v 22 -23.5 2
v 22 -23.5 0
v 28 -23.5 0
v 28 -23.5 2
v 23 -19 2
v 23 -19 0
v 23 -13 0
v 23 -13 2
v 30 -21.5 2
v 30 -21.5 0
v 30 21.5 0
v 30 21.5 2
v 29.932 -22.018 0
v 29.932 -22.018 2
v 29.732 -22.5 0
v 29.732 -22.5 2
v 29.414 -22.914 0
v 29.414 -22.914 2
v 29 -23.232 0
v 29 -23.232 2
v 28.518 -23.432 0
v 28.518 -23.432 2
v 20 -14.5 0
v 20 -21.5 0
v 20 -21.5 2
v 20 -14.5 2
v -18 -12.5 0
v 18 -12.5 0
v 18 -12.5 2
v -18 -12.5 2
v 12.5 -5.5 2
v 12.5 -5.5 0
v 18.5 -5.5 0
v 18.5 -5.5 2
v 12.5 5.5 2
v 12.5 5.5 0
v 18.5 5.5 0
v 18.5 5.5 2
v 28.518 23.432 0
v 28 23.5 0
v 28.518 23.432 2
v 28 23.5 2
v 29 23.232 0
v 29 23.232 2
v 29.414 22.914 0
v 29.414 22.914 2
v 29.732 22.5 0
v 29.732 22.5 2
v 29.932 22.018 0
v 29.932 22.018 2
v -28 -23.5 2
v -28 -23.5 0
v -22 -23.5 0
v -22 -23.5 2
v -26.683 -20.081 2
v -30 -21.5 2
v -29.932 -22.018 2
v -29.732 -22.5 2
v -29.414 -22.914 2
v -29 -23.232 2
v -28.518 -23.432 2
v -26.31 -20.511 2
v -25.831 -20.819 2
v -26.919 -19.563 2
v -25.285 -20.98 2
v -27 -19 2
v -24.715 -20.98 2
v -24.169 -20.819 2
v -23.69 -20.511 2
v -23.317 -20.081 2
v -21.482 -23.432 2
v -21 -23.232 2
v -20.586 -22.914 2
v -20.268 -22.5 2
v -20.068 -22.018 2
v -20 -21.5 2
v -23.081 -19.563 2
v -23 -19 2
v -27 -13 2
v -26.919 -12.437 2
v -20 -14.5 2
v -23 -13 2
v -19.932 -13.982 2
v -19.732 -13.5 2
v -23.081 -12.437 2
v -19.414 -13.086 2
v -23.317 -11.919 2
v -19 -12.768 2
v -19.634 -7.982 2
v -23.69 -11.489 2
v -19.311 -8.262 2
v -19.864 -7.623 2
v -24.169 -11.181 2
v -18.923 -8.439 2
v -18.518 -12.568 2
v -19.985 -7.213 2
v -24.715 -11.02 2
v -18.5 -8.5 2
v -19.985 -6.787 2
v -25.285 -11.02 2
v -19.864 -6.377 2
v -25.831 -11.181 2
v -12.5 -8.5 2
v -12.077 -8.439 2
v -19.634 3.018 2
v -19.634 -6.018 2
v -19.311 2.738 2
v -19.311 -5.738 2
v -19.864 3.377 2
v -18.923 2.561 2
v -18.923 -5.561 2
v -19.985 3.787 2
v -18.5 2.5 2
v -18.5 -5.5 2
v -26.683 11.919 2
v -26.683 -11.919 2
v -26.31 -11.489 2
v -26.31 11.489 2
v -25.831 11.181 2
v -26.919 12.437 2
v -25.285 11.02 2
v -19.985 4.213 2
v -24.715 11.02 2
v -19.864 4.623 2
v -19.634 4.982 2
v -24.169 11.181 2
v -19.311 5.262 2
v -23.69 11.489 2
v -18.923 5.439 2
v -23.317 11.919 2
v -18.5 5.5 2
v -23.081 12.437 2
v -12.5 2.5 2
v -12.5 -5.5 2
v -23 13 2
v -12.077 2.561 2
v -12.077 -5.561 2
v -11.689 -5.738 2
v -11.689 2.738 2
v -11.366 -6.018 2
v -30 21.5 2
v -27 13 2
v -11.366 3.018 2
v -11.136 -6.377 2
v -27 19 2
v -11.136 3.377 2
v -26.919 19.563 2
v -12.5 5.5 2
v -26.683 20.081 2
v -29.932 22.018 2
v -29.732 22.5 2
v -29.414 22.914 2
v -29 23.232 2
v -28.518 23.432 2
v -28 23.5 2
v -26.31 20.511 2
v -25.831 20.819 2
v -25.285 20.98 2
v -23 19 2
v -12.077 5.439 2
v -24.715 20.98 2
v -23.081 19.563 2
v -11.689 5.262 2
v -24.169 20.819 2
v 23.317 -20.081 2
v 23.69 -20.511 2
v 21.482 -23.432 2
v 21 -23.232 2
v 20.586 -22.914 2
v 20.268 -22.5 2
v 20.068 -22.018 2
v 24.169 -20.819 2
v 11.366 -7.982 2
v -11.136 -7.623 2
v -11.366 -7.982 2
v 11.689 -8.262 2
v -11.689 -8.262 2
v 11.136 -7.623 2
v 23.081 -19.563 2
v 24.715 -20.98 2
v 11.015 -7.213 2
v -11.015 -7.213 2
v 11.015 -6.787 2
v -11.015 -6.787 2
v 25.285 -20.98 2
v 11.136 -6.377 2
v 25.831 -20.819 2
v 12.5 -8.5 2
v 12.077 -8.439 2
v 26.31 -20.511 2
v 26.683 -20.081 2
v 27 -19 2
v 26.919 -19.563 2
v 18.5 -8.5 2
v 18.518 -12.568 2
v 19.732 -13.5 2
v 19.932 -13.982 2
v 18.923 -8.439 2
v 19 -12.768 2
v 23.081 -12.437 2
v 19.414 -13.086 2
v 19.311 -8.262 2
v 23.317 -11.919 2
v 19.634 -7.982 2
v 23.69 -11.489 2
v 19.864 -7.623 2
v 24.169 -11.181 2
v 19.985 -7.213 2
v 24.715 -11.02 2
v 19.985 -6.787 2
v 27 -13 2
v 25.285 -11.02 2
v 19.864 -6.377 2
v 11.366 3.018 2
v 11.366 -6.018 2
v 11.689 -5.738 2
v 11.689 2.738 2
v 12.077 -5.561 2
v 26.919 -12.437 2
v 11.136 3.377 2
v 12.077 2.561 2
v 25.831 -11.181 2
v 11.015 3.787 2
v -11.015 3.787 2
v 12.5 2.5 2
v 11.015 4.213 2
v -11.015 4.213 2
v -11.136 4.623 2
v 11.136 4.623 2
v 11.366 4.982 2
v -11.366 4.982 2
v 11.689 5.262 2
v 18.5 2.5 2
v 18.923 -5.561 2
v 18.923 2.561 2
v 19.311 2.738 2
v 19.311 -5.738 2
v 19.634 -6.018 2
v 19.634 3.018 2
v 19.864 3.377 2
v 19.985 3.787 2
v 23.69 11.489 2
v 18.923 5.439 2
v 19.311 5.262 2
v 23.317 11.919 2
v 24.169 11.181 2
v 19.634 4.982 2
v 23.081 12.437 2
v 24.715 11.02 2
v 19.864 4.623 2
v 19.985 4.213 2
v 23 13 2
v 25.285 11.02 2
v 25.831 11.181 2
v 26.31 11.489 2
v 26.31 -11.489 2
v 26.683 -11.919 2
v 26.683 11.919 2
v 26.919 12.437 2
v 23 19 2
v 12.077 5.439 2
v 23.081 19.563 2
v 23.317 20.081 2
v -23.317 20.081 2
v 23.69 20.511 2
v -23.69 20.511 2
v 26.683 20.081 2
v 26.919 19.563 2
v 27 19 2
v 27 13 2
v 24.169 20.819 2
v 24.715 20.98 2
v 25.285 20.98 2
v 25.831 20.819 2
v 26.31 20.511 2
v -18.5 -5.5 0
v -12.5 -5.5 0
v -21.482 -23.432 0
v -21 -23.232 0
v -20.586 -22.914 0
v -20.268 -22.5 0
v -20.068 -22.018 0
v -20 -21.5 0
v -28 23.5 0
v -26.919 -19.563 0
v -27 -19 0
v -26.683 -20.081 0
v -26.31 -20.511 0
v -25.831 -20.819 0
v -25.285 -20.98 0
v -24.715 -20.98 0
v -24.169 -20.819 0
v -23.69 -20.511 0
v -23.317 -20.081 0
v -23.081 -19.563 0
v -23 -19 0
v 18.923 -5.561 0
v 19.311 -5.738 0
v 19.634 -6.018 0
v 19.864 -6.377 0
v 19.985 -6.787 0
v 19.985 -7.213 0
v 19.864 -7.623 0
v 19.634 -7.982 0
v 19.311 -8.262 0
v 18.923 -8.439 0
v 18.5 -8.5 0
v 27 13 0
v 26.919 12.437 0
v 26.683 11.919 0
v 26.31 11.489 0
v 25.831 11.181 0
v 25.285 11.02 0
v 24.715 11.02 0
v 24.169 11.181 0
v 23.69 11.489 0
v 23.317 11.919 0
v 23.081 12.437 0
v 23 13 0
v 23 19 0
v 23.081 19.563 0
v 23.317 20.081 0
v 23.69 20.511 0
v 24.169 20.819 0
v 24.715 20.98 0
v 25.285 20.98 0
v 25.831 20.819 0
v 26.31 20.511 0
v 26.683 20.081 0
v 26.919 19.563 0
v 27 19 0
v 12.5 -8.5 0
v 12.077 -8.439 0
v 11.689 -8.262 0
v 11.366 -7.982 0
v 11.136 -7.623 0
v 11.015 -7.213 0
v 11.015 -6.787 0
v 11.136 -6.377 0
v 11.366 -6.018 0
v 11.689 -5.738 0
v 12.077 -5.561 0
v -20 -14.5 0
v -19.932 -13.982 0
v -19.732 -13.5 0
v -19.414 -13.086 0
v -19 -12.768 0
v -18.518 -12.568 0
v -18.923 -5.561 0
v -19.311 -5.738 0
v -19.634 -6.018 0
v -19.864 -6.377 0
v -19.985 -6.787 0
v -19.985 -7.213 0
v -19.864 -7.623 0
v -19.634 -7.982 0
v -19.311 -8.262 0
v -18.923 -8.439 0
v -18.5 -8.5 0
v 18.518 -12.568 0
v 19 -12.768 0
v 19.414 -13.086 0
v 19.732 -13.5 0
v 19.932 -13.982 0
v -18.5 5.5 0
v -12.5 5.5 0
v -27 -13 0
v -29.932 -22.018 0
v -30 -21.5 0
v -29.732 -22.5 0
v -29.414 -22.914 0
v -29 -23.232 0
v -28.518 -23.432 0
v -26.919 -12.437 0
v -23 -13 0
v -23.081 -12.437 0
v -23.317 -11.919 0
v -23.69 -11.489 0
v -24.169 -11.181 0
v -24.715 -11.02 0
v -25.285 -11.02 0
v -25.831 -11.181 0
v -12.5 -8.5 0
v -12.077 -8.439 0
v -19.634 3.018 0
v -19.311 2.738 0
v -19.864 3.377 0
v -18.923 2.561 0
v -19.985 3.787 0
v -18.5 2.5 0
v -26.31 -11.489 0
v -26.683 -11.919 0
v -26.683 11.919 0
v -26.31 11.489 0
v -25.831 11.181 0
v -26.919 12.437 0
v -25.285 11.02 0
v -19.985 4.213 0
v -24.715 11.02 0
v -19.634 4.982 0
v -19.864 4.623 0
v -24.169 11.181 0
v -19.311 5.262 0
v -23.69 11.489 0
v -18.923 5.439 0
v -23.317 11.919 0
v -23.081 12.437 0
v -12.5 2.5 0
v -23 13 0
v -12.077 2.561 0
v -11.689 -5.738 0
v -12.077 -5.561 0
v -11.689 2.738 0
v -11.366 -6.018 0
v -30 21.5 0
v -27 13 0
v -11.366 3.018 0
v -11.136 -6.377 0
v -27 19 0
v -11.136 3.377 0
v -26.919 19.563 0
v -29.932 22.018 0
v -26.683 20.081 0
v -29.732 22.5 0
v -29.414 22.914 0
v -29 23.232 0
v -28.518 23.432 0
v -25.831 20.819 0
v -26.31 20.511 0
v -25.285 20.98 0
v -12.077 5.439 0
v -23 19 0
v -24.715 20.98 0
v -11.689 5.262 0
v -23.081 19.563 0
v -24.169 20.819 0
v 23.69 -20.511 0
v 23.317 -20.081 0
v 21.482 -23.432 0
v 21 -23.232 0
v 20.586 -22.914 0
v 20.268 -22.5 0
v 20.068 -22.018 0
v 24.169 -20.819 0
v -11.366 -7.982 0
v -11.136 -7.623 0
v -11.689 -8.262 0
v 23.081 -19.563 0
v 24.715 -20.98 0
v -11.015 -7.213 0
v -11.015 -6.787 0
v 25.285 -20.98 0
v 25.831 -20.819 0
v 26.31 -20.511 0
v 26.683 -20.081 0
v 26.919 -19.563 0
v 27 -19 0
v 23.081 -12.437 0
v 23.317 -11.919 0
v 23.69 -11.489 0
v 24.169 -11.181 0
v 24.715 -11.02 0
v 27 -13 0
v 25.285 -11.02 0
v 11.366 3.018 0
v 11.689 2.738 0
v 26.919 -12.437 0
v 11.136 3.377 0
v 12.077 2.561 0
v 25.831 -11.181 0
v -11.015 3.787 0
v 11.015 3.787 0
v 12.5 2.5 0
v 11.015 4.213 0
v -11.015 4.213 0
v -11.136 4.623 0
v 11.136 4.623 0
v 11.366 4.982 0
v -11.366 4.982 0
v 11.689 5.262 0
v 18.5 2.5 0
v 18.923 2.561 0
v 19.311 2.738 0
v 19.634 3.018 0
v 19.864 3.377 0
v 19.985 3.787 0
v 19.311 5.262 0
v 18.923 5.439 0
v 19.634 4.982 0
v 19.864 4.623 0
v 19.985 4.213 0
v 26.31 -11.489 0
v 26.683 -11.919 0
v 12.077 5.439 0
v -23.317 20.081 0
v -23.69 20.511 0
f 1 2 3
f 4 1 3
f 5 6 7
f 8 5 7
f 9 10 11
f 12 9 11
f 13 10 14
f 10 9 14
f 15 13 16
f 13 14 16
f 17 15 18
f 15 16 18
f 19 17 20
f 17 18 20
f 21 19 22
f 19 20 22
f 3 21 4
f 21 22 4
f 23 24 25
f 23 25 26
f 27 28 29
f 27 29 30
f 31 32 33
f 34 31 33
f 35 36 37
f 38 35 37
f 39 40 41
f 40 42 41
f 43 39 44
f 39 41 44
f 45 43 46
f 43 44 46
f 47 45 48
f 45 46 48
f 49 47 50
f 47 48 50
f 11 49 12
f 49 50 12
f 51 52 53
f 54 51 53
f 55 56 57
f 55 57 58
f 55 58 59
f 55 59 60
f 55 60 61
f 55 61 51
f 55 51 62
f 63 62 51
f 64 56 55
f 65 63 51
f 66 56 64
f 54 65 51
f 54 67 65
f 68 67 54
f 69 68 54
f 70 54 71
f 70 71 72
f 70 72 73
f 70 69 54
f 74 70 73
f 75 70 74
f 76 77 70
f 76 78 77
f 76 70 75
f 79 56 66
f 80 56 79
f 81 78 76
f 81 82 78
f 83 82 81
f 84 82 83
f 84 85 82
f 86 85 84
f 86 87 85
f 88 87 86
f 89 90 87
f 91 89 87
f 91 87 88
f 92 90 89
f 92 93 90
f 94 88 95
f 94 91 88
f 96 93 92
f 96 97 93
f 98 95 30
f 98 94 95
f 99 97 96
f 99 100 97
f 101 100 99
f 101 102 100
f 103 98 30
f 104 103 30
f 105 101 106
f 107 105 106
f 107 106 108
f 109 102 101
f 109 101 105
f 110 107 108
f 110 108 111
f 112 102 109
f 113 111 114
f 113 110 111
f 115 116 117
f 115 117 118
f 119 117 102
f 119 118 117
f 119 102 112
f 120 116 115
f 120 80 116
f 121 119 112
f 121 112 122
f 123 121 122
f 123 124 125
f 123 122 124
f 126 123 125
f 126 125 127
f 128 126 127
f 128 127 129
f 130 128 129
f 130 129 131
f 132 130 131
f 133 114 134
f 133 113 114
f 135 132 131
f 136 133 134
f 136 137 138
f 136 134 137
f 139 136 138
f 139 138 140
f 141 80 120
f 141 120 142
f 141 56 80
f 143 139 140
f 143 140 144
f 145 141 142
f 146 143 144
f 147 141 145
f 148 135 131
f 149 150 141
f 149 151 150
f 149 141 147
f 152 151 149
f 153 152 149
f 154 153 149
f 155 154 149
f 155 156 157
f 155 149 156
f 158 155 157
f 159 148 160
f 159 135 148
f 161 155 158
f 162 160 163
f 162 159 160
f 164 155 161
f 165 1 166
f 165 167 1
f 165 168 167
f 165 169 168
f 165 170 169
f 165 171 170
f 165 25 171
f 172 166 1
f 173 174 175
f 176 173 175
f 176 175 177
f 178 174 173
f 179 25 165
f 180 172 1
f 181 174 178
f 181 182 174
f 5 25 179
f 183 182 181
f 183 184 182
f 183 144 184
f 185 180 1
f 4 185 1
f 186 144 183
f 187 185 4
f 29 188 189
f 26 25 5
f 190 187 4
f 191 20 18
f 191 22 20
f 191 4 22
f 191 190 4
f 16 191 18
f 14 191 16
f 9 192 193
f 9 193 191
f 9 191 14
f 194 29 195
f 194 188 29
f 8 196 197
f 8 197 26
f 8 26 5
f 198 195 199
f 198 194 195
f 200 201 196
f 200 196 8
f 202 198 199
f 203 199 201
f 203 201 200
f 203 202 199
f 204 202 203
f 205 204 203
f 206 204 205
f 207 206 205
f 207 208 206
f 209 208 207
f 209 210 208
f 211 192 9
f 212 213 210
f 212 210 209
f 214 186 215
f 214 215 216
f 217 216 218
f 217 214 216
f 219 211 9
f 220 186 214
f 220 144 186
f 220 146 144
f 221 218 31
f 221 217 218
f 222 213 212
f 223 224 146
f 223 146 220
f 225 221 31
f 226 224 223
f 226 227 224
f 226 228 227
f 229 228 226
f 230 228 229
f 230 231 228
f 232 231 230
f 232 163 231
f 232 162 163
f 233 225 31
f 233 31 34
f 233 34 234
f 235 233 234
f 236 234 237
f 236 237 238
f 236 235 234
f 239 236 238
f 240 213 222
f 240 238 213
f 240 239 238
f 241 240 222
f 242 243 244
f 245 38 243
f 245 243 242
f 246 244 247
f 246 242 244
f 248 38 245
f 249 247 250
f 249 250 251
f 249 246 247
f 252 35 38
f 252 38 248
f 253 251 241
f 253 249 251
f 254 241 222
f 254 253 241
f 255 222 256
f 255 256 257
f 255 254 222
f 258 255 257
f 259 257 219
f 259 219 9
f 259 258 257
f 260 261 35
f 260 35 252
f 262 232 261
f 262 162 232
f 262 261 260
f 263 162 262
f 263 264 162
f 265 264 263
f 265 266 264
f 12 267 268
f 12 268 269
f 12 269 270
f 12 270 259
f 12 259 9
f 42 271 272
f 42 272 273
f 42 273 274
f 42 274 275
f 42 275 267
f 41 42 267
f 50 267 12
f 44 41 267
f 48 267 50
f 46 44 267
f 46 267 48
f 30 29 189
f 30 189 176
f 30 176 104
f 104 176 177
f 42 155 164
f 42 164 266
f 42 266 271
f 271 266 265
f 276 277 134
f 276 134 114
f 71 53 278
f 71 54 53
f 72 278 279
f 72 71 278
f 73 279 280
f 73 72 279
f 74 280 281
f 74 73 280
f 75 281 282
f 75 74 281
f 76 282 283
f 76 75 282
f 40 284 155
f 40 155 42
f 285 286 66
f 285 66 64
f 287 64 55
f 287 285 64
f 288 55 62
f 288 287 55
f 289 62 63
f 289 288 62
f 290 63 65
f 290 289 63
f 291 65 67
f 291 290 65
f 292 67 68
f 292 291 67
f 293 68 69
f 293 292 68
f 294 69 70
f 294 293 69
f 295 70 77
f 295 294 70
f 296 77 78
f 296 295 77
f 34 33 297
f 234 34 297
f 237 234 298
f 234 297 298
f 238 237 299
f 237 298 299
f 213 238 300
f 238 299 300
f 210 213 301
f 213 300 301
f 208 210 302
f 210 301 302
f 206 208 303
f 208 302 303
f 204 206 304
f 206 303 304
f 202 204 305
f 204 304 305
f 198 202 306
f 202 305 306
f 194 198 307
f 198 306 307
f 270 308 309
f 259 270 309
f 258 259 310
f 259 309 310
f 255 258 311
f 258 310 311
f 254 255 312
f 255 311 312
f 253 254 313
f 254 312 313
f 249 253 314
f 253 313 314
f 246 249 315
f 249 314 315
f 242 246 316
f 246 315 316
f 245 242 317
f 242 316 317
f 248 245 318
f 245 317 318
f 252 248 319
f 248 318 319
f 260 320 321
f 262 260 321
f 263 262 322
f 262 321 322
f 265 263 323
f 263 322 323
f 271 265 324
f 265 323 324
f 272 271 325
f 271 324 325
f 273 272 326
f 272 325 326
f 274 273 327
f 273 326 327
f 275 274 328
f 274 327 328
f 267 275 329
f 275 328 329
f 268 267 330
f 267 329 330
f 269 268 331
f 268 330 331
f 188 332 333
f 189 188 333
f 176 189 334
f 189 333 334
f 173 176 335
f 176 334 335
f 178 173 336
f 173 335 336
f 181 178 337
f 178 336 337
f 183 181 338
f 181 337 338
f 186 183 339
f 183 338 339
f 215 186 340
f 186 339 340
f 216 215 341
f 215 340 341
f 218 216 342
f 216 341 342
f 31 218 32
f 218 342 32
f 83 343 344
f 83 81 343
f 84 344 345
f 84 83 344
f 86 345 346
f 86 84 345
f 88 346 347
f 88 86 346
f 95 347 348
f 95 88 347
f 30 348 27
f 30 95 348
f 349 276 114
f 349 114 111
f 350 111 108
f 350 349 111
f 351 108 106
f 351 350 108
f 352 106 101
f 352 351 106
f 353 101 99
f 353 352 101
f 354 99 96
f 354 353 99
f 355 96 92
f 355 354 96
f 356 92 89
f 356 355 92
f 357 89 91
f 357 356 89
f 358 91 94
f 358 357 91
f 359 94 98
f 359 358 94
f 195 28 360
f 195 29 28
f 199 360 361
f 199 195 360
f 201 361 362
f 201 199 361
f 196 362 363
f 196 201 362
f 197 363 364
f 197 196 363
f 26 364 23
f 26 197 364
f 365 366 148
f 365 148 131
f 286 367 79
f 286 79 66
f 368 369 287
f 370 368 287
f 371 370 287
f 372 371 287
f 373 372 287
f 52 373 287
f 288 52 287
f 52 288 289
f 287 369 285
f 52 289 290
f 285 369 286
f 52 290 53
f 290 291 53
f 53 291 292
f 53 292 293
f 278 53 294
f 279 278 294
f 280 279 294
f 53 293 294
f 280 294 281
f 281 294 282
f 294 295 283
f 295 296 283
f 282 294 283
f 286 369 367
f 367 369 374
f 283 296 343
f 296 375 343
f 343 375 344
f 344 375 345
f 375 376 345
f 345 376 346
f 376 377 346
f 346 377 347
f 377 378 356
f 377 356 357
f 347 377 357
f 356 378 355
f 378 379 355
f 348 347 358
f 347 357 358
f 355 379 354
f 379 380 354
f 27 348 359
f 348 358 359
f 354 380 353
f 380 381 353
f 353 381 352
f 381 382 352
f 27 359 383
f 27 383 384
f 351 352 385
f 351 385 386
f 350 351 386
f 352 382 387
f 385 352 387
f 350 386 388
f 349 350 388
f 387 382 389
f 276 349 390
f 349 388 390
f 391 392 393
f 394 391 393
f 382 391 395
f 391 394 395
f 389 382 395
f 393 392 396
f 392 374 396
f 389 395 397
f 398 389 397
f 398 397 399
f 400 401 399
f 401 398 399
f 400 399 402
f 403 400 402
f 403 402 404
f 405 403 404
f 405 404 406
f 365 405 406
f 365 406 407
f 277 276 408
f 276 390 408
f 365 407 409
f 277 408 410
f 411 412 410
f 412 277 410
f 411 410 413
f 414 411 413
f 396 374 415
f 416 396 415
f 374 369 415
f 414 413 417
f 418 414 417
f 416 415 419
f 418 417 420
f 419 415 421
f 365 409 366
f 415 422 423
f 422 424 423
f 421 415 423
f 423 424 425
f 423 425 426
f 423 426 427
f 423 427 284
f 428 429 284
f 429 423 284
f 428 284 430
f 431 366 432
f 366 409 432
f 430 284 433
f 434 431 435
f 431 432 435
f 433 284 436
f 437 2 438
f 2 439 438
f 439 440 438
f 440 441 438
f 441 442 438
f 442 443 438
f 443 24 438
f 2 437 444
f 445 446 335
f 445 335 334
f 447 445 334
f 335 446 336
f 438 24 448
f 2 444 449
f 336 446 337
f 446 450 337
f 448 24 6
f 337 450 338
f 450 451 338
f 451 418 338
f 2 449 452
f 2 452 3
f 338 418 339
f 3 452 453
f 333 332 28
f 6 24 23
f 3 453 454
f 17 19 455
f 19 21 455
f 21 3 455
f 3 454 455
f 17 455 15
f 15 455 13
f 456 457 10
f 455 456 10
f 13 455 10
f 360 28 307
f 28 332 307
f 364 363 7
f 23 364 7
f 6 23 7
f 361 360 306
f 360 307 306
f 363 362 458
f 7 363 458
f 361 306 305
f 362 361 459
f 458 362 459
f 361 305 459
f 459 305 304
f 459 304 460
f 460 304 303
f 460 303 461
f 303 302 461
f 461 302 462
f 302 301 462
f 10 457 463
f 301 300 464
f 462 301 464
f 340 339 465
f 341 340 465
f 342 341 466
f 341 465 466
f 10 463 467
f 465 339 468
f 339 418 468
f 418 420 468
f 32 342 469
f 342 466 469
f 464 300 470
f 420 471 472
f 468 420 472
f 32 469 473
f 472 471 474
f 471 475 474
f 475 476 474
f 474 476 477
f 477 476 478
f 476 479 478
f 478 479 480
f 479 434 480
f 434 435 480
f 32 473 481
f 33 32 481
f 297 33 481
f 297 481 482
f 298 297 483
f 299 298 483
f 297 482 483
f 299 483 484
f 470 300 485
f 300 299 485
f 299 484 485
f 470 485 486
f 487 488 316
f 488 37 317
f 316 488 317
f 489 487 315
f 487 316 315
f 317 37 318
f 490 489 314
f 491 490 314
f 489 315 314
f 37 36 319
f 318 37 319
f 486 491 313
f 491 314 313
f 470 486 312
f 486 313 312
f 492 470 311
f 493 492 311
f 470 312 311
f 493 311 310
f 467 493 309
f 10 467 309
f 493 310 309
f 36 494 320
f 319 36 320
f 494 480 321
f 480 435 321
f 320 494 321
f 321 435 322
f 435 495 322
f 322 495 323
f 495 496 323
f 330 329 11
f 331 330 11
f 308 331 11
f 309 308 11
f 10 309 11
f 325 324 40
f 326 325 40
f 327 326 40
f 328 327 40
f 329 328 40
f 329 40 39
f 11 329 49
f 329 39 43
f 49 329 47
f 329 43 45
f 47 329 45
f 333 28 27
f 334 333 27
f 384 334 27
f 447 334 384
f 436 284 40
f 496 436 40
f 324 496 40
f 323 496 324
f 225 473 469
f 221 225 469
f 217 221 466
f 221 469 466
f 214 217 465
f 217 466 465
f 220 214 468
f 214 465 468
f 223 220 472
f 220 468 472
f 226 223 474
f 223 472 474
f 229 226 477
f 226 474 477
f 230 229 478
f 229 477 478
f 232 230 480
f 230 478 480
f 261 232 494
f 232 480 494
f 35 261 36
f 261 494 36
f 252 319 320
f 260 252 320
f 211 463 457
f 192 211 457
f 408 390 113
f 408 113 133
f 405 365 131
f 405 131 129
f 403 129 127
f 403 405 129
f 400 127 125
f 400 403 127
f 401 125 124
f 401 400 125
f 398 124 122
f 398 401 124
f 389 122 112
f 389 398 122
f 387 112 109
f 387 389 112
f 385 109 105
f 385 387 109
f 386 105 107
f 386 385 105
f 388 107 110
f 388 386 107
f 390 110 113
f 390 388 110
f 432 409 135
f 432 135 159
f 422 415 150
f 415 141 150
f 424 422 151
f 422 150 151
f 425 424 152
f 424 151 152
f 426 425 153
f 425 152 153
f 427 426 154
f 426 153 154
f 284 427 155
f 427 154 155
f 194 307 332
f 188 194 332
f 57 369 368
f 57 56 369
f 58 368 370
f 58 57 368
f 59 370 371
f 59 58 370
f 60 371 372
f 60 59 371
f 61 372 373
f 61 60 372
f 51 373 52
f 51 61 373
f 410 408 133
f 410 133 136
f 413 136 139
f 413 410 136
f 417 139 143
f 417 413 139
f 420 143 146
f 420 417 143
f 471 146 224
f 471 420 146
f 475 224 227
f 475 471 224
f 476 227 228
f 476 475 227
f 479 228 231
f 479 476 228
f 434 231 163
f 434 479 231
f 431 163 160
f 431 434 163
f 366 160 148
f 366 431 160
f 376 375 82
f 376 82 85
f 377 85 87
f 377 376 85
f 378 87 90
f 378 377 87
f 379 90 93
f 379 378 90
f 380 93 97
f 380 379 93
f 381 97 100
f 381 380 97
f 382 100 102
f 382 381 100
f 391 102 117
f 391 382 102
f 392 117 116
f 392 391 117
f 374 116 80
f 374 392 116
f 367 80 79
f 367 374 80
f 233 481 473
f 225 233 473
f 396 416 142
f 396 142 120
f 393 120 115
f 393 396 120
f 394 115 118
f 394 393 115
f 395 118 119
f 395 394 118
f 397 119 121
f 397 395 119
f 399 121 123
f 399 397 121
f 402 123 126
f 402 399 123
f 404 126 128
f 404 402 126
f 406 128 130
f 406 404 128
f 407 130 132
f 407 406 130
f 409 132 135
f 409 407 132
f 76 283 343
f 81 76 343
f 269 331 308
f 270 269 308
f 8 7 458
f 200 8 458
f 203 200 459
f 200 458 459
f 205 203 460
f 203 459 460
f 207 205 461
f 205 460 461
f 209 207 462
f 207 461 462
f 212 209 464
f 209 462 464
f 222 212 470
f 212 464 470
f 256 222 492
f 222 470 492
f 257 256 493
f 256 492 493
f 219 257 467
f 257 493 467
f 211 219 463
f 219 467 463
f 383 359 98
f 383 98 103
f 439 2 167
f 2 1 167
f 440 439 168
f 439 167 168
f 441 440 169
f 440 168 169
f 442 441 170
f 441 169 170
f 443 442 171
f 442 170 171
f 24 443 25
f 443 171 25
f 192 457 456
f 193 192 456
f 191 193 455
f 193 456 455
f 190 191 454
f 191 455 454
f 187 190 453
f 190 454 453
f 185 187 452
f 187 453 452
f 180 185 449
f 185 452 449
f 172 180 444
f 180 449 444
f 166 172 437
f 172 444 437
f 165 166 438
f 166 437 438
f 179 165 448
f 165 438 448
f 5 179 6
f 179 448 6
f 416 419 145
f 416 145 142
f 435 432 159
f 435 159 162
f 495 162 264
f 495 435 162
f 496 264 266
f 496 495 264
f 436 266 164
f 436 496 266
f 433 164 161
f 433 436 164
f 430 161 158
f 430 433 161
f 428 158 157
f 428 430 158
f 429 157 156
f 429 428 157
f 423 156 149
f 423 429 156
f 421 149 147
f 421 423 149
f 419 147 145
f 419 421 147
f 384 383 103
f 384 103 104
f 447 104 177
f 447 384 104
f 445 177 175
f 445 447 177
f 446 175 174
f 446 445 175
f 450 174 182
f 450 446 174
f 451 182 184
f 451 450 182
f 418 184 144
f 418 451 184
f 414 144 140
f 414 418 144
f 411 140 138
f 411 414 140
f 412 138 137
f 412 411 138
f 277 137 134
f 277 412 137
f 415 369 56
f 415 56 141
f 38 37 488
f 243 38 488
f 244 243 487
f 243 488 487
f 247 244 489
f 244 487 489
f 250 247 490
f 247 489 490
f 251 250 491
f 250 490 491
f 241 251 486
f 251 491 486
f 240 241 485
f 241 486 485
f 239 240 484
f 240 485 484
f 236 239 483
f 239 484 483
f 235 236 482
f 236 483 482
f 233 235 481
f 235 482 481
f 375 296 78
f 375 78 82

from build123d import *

# Parameters (mm, degrees)
SKETCH1_W           = 60
SKETCH1_H           = 47
BOSS_EXTRUDE1_DEPTH = 2
SKETCH2_W           = 40
SKETCH2_H           = 11
CUT_EXTRUDE1_DEPTH  = 2
CUT_EXTRUDE2_DEPTH  = 2
CUT_EXTRUDE3_DEPTH  = 2
CUT_EXTRUDE4_DEPTH  = 2
CUT_EXTRUDE5_DEPTH  = 2
FILLET1_R           = 2


with BuildPart() as part:
    # Sketch1 → Boss-Extrude1 (new body)
    with BuildSketch(Plane.XY):
        Rectangle(SKETCH1_W, SKETCH1_H)
    extrude(amount=BOSS_EXTRUDE1_DEPTH)

    # Sketch2 → Cut-Extrude1 (cut)
    with BuildSketch(Plane(origin=(0, 0, 0), x_dir=(-1, 0, 0), z_dir=(0, 0, -1))):
        with Locations((0, -18)):
            Rectangle(SKETCH2_W, SKETCH2_H)
    extrude(amount=-CUT_EXTRUDE1_DEPTH, mode=Mode.SUBTRACT)

    # Sketch3 → Cut-Extrude2 (cut)
    with BuildSketch(Plane(origin=(0, 0, 0), x_dir=(-1, 0, 0), z_dir=(0, 0, -1))):
        with BuildLine():
            Line((27, -13), (27, -19))
            ThreePointArc((27, -19), (25, -21), (23, -19))
            Line((23, -19), (23, -13))
            ThreePointArc((23, -13), (25, -11), (27, -13))
        make_face()
    cut_extrude2 = extrude(amount=-CUT_EXTRUDE2_DEPTH, mode=Mode.SUBTRACT)

    # Sketch4 → Cut-Extrude3 (cut)
    with BuildSketch(Plane(origin=(0, 0, 0), x_dir=(-1, 0, 0), z_dir=(0, 0, -1))):
        with BuildLine():
            Line((27, 19), (27, 13))
            ThreePointArc((27, 13), (25, 11), (23, 13))
            Line((23, 13), (23, 19))
            ThreePointArc((23, 19), (25, 21), (27, 19))
        make_face()
    cut_extrude3 = extrude(amount=-CUT_EXTRUDE3_DEPTH, mode=Mode.SUBTRACT)

    # Sketch5 → Cut-Extrude4 (cut)
    with BuildSketch(Plane(origin=(0, 0, 0), x_dir=(-1, 0, 0), z_dir=(0, 0, -1))):
        with BuildLine():
            Line((12.5, -5.5), (18.5, -5.5))
            ThreePointArc((18.5, -5.5), (20, -7), (18.5, -8.5))
            Line((18.5, -8.5), (12.5, -8.5))
            ThreePointArc((12.5, -8.5), (11, -7), (12.5, -5.5))
        make_face()
    cut_extrude4 = extrude(amount=-CUT_EXTRUDE4_DEPTH, mode=Mode.SUBTRACT)

    # Sketch6 → Cut-Extrude5 (cut)
    with BuildSketch(Plane(origin=(0, 0, 0), x_dir=(-1, 0, 0), z_dir=(0, 0, -1))):
        with BuildLine():
            Line((12.5, 5.5), (18.5, 5.5))
            ThreePointArc((18.5, 5.5), (20, 4), (18.5, 2.5))
            Line((18.5, 2.5), (12.5, 2.5))
            ThreePointArc((12.5, 2.5), (11, 4), (12.5, 5.5))
        make_face()
    cut_extrude5 = extrude(amount=-CUT_EXTRUDE5_DEPTH, mode=Mode.SUBTRACT)

    # Mirror1: Cut-Extrude2, Cut-Extrude3, Cut-Extrude4, Cut-Extrude5 across plane
    add(cut_extrude2.mirror(Plane.ZY), mode=Mode.SUBTRACT)
    add(cut_extrude3.mirror(Plane.ZY), mode=Mode.SUBTRACT)
    add(cut_extrude4.mirror(Plane.ZY), mode=Mode.SUBTRACT)
    add(cut_extrude5.mirror(Plane.ZY), mode=Mode.SUBTRACT)

    # Fillet1
    fillet1_edges = [part.edges().sort_by_distance(p)[0] for p in [
        (-20, -12.5, 1),
        (-20, -23.5, 1),
        (20, -23.5, 1),
        (20, -12.5, 1),
        (30, -23.5, 1),
        (-30, -23.5, 1),
        (-30, 23.5, 1),
        (30, 23.5, 1),
    ]]
    fillet(fillet1_edges, radius=FILLET1_R)


solid = part.part
